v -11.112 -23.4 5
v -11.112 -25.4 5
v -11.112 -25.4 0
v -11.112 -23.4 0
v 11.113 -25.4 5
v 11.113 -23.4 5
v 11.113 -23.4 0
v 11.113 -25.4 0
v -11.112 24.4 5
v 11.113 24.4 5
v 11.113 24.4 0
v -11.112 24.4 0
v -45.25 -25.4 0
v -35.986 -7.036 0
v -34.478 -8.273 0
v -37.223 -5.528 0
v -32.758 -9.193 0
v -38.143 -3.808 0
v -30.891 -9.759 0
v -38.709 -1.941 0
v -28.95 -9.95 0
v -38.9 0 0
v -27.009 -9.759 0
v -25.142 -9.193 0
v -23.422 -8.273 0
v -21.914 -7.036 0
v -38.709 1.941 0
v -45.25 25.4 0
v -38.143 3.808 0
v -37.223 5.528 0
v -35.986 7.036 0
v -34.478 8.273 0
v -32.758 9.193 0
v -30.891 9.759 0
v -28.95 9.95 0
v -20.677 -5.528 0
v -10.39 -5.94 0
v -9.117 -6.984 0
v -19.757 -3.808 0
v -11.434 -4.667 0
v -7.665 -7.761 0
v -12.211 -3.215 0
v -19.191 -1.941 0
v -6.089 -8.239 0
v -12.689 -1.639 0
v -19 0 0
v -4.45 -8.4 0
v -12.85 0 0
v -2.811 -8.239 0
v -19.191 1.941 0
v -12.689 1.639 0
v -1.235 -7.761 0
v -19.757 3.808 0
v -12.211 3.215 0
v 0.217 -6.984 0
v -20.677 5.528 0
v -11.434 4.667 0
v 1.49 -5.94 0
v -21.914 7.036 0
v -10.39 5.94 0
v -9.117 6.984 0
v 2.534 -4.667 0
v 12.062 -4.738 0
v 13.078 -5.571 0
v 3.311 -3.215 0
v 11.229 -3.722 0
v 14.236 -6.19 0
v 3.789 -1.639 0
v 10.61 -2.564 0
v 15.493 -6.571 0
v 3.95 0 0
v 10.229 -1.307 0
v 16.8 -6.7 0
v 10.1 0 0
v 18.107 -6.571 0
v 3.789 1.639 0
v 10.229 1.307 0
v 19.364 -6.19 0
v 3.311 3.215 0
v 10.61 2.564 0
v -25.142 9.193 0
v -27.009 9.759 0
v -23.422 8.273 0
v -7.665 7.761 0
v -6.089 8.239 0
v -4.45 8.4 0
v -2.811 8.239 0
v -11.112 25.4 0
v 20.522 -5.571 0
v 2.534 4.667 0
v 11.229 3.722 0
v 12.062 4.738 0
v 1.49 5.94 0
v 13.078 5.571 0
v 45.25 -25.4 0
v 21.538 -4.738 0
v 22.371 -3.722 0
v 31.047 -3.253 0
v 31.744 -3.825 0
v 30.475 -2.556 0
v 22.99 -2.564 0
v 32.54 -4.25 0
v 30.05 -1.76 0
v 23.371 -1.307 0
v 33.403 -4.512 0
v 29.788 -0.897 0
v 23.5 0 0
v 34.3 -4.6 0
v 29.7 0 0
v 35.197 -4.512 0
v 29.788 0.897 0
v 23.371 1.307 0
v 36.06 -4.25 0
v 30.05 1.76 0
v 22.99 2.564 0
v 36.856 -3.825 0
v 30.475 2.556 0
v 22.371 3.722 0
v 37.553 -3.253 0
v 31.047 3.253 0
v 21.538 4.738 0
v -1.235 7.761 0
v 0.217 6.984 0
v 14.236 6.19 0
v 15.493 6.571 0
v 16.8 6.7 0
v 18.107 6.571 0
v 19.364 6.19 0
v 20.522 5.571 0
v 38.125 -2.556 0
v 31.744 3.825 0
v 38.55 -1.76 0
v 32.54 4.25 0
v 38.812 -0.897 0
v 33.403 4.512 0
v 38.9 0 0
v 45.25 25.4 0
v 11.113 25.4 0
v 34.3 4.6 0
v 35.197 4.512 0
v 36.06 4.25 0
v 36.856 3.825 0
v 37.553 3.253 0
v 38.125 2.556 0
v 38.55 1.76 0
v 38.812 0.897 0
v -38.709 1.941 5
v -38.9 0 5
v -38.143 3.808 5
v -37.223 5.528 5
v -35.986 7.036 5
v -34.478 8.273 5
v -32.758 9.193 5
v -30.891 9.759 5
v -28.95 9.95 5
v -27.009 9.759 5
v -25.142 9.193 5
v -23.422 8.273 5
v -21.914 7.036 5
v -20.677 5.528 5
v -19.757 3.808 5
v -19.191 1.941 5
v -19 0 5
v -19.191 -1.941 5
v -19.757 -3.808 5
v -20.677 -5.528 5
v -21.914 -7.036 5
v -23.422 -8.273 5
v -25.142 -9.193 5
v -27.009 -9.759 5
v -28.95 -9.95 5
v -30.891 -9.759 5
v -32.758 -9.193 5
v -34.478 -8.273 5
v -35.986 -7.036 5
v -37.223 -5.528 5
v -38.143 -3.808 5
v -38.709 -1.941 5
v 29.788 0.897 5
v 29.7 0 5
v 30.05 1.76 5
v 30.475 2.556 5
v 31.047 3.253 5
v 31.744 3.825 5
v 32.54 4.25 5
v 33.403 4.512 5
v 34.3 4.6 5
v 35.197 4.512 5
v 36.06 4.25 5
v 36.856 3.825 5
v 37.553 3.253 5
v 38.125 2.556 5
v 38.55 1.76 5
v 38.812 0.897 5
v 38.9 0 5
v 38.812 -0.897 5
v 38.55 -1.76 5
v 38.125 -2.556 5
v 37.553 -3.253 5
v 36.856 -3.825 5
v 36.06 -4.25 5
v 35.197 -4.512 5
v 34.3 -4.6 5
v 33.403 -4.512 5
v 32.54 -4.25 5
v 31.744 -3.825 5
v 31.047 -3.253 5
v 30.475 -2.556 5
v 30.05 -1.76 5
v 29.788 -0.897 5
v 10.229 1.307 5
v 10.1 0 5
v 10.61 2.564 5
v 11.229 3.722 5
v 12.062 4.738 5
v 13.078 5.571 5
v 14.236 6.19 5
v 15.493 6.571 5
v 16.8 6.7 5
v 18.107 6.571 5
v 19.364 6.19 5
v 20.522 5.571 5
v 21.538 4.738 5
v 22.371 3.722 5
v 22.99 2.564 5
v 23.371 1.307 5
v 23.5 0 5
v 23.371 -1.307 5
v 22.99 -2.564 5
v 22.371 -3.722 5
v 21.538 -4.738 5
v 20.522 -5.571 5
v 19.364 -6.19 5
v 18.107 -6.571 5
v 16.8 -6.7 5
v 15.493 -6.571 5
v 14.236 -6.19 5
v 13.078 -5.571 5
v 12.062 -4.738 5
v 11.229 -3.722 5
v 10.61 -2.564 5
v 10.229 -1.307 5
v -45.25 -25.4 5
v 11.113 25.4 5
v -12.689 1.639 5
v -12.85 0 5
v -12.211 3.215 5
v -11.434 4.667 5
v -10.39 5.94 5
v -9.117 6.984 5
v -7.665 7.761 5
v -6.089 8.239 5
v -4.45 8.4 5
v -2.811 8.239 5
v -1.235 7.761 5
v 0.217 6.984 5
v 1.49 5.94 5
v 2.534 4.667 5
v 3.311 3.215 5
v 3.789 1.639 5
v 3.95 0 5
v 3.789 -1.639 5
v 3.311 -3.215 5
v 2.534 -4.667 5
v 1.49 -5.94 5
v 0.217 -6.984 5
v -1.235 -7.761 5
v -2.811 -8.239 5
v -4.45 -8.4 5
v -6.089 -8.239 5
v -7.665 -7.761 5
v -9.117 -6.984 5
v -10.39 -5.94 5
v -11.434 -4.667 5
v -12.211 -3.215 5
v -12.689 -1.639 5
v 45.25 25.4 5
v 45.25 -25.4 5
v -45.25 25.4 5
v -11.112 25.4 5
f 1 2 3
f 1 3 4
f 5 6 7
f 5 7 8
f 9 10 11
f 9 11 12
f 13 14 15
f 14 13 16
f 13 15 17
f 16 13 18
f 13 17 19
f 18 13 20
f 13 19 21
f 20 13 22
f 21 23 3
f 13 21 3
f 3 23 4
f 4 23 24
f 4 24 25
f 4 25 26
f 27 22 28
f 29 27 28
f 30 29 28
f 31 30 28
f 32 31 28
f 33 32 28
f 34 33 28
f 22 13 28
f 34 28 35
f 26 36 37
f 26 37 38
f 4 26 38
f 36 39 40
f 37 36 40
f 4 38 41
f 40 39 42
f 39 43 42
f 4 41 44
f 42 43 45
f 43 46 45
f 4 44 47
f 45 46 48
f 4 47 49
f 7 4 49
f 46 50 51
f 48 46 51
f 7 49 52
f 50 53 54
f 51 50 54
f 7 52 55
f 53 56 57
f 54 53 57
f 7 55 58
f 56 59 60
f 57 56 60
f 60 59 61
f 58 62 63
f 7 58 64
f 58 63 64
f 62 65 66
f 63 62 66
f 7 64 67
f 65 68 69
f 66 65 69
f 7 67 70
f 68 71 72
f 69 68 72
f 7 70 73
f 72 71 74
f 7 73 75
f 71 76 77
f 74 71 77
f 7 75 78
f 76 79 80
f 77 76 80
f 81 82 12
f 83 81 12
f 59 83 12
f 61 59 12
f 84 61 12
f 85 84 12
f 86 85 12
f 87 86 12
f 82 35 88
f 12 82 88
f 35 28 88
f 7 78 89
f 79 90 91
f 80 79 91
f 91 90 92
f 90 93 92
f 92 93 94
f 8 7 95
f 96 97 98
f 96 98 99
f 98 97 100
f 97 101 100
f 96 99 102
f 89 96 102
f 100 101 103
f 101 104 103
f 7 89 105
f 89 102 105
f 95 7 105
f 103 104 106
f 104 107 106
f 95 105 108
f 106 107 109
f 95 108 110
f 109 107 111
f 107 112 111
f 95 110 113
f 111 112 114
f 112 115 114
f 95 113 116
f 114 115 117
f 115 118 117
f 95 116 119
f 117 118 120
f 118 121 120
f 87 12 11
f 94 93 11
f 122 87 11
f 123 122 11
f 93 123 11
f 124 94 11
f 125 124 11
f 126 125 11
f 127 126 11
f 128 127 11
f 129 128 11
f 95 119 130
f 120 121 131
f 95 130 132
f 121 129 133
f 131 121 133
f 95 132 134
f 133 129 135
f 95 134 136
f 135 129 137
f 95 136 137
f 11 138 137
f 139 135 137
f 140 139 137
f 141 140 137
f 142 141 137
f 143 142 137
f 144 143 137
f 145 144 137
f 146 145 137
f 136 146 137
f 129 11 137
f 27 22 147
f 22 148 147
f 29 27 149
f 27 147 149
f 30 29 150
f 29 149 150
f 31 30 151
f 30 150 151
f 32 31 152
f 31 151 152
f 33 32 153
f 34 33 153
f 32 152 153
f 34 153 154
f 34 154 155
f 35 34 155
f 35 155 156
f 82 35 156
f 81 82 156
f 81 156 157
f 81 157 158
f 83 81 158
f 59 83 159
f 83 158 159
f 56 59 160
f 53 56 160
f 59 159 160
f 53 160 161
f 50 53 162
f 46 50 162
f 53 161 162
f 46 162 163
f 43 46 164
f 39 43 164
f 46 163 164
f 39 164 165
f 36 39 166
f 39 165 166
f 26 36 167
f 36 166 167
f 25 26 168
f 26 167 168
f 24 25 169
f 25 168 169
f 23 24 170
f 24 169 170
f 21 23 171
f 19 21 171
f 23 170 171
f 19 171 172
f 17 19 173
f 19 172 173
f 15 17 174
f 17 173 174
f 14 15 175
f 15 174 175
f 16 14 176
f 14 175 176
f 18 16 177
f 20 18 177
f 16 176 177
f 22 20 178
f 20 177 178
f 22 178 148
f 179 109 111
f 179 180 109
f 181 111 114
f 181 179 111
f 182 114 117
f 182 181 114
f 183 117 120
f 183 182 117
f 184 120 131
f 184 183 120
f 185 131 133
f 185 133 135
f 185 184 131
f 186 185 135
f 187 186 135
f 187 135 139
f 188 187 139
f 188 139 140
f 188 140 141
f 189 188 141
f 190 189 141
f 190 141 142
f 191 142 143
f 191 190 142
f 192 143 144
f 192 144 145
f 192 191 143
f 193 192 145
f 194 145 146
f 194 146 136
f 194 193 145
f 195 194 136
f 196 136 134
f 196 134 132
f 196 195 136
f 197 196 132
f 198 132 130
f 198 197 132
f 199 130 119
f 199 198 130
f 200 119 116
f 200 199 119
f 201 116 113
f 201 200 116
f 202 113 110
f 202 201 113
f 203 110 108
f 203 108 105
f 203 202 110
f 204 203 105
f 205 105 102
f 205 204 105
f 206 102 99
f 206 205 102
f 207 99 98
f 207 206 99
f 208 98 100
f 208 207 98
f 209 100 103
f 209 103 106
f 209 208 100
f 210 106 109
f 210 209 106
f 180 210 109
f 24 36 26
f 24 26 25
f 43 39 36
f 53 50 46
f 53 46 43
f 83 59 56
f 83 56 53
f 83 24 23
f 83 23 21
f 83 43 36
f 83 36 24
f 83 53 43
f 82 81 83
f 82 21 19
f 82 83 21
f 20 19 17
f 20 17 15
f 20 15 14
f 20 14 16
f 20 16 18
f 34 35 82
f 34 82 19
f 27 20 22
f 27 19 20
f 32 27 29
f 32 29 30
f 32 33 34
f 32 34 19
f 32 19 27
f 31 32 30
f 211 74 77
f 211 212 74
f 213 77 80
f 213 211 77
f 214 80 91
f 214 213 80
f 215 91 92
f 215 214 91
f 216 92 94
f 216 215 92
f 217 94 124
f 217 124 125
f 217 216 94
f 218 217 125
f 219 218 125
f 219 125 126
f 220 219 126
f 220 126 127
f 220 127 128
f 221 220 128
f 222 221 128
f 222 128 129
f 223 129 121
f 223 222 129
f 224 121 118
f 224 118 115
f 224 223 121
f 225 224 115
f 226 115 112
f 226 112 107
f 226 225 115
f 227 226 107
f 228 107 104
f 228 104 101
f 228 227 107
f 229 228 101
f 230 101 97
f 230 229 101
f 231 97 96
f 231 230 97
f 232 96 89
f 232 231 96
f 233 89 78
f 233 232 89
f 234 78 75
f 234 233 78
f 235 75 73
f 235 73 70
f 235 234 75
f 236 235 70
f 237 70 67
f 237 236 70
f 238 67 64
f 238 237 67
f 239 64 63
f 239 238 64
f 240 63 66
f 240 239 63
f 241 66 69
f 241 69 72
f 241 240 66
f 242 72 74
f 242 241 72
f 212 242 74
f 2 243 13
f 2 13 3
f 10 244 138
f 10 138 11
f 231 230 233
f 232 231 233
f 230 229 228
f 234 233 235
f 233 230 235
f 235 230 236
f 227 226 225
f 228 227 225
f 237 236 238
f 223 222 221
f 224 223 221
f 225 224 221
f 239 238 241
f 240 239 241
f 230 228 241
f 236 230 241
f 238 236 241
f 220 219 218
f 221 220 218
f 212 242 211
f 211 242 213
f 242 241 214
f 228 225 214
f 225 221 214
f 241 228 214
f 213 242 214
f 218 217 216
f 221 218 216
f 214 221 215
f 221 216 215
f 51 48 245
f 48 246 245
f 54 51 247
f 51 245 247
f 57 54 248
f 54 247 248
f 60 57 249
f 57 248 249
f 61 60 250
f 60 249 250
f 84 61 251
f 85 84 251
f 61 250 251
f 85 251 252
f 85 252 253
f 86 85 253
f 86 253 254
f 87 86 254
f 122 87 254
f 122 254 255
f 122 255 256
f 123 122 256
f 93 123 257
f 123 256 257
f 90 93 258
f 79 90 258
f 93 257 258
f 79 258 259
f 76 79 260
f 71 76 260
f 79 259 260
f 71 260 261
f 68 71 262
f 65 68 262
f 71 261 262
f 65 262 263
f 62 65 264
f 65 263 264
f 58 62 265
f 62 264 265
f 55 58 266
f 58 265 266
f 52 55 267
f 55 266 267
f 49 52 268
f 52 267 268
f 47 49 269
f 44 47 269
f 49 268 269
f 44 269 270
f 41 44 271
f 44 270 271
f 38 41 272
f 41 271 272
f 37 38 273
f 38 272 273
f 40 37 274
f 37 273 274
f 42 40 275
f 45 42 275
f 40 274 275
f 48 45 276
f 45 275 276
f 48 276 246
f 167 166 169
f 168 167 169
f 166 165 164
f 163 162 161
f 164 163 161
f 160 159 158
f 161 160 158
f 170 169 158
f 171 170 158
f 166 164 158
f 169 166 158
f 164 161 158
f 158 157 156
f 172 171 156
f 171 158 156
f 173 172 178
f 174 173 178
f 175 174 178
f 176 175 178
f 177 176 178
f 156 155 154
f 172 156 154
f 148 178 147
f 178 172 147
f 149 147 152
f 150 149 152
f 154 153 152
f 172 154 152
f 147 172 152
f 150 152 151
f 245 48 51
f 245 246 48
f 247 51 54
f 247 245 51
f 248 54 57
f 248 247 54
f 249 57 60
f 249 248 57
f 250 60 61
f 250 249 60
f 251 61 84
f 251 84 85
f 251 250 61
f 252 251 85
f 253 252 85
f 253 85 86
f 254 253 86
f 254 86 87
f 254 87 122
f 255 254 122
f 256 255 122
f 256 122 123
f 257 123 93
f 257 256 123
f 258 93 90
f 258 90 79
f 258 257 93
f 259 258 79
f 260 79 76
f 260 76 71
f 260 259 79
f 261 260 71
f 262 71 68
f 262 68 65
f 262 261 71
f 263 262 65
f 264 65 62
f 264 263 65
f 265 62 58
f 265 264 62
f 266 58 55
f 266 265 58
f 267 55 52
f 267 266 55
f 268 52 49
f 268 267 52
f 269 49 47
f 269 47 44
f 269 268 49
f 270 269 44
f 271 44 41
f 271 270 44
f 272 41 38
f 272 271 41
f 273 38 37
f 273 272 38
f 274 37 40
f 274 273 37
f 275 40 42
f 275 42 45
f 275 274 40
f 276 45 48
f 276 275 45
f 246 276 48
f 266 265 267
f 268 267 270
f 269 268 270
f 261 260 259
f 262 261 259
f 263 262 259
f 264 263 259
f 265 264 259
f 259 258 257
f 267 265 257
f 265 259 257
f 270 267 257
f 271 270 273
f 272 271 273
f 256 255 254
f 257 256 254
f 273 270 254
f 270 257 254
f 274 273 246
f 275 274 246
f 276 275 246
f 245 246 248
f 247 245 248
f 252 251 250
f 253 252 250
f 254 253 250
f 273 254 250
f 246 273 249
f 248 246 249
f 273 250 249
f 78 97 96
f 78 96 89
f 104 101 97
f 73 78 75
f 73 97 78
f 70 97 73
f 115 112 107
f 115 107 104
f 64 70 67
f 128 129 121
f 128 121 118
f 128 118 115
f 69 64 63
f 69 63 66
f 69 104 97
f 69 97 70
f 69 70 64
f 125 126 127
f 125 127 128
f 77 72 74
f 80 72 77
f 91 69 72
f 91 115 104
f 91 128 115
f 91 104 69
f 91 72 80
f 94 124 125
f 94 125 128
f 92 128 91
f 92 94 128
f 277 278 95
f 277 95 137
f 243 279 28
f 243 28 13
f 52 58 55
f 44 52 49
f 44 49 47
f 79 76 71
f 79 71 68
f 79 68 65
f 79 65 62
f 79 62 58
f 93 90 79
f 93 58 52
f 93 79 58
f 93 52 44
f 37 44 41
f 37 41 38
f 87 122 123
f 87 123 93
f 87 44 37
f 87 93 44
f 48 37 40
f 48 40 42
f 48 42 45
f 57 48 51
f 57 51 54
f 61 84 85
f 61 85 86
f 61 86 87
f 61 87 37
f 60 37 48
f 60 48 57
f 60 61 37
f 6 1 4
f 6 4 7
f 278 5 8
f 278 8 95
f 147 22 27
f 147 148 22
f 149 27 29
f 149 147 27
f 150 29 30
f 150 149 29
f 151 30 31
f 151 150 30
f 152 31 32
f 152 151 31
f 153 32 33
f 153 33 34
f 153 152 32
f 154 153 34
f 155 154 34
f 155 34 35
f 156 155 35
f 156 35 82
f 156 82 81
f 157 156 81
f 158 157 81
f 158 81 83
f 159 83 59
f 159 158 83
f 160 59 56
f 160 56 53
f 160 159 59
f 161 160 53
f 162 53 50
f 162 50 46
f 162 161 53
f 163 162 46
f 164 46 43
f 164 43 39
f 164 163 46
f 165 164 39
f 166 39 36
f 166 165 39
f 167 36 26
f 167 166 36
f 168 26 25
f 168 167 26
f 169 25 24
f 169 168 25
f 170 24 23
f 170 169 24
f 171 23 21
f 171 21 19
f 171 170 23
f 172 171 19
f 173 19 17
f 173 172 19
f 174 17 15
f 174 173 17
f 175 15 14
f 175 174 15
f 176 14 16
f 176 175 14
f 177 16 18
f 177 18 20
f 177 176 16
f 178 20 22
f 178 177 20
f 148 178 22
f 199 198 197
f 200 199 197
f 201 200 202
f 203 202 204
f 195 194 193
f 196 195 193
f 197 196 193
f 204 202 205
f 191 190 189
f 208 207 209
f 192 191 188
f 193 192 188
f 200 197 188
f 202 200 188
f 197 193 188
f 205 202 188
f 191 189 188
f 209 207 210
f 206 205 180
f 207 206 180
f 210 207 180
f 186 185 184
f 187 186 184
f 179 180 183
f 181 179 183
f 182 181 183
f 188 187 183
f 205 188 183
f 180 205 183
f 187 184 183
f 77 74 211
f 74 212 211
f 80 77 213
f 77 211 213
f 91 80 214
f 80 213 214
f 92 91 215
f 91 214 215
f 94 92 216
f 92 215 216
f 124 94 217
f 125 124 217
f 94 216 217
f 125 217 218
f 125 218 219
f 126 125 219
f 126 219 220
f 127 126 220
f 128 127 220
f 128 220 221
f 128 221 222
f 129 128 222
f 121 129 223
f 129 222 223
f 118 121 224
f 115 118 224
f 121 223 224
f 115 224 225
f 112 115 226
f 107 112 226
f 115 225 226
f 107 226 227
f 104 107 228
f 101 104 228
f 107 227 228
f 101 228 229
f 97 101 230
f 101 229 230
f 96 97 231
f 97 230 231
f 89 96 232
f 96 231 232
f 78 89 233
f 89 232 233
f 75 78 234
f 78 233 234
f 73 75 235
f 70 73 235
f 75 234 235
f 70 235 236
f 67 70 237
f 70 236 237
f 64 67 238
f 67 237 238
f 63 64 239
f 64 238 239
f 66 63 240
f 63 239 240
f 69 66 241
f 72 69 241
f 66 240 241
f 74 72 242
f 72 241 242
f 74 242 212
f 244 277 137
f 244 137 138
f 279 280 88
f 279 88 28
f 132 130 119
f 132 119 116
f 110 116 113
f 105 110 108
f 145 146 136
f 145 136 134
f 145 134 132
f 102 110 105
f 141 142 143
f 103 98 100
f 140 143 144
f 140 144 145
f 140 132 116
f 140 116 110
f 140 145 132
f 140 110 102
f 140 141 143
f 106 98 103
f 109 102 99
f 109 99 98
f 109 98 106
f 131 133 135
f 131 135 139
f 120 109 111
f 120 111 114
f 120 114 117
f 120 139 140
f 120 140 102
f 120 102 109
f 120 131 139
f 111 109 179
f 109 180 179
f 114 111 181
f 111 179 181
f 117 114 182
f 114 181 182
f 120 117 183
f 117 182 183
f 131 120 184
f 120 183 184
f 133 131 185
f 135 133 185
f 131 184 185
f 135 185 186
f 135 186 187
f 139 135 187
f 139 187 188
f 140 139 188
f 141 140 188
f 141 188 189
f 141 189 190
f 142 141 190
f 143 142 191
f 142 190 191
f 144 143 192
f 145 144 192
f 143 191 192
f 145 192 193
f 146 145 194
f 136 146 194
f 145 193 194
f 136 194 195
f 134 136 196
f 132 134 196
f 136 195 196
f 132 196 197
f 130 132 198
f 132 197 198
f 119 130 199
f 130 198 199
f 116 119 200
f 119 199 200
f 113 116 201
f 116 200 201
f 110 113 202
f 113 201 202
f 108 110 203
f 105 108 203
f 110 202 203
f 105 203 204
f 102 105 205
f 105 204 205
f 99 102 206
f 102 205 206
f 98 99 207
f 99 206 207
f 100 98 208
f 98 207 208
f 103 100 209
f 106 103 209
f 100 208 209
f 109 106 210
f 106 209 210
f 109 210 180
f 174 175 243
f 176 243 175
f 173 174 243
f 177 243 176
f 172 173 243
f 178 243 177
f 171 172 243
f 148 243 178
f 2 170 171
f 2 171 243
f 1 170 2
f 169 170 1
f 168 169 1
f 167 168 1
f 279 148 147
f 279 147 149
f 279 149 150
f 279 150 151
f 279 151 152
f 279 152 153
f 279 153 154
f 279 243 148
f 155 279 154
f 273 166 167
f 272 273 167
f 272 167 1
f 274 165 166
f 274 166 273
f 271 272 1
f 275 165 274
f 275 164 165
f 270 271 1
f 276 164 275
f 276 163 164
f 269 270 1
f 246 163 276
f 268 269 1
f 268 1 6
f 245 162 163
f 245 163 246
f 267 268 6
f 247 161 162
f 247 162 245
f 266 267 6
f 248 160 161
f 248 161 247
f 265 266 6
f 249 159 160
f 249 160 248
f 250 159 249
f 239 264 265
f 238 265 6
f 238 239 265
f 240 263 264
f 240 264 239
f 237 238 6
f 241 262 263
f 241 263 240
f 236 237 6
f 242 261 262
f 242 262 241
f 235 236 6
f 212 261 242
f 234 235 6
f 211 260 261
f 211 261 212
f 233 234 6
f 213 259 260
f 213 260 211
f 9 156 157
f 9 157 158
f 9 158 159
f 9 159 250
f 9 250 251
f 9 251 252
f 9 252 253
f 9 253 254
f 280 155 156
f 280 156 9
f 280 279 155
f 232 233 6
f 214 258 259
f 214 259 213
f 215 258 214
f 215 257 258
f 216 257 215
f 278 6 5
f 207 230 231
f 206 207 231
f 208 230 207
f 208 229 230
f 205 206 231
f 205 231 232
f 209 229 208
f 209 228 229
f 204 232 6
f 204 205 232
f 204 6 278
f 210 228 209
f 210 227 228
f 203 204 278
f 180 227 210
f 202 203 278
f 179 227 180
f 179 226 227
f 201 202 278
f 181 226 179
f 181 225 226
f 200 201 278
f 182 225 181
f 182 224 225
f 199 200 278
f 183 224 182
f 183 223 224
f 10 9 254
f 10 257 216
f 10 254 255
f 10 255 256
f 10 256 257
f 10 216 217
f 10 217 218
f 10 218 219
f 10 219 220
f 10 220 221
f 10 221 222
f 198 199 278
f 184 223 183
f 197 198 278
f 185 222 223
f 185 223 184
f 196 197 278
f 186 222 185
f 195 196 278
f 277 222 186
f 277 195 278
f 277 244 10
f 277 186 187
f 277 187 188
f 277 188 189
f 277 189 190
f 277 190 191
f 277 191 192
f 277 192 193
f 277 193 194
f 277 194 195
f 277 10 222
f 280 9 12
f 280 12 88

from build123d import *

# Parameters (mm, degrees)
F0_W   = 9.95
F0_H   = 5
F0_W_2 = 8.4
F0_W_3 = 6.7
F0_W_4 = 4.6


# Not quite as in the source:
# - a feature names something its author has since deleted; it is built from what else it names


with BuildPart() as f2:
    # F2: sweep along a path in F0
    with BuildLine(Plane.XZ) as f2_path:
        Line((-38.9, 0), (-38.9, 5))
    # F1 (on Top) → F2 (sweep)
    with BuildSketch(Plane.XY):
        Polygon((-11.1125, 25.4), (-45.25, 25.4), (-45.25, -25.4), (-11.1125, -25.4), (-11.1125, -23.4), (11.1125, -23.4), (11.1125, -25.4), (45.25, -25.4), (45.25, 25.4), (11.1125, 25.4), (11.1125, 24.4), (-11.1125, 24.4), align=None)
    sweep(path=f2_path.line)


with BuildPart() as f3:
    # F0 (on Front) → F3 (revolve)
    with BuildSketch(Plane.XZ):
        with Locations((-33.925, 2.5)):
            Rectangle(F0_W, F0_H)
    revolve(axis=Axis((-28.95, 0, 2.5), (0, 0, -1)))


with BuildPart() as f4:
    # F0 (on Front) → F4 (revolve)
    with BuildSketch(Plane.XZ):
        with Locations((-8.65, 2.5)):
            Rectangle(F0_W_2, F0_H)
    revolve(axis=Axis((-4.45, 0, 2.5), (0, 0, -1)))


with BuildPart() as f5:
    # F0 (on Front) → F5 (revolve)
    with BuildSketch(Plane.XZ):
        with Locations((13.45, 2.5)):
            Rectangle(F0_W_3, F0_H)
    revolve(axis=Axis((16.8, 0, 2.5), (0, 0, -1)))


with BuildPart() as f6:
    # F0 (on Front) → F6 (revolve)
    with BuildSketch(Plane.XZ):
        with Locations((32, 2.5)):
            Rectangle(F0_W_4, F0_H)
    revolve(axis=Axis((34.3, 0, 2.5), (0, 0, -1)))


with BuildPart() as f2_1:
    add(f2.part)

    # F7: cut F3, F4, F6, F5
    add(f3.part, mode=Mode.SUBTRACT)
    add(f4.part, mode=Mode.SUBTRACT)
    add(f6.part, mode=Mode.SUBTRACT)
    add(f5.part, mode=Mode.SUBTRACT)


solid = Compound([f3.part, f4.part, f5.part, f6.part, f2_1.part])
